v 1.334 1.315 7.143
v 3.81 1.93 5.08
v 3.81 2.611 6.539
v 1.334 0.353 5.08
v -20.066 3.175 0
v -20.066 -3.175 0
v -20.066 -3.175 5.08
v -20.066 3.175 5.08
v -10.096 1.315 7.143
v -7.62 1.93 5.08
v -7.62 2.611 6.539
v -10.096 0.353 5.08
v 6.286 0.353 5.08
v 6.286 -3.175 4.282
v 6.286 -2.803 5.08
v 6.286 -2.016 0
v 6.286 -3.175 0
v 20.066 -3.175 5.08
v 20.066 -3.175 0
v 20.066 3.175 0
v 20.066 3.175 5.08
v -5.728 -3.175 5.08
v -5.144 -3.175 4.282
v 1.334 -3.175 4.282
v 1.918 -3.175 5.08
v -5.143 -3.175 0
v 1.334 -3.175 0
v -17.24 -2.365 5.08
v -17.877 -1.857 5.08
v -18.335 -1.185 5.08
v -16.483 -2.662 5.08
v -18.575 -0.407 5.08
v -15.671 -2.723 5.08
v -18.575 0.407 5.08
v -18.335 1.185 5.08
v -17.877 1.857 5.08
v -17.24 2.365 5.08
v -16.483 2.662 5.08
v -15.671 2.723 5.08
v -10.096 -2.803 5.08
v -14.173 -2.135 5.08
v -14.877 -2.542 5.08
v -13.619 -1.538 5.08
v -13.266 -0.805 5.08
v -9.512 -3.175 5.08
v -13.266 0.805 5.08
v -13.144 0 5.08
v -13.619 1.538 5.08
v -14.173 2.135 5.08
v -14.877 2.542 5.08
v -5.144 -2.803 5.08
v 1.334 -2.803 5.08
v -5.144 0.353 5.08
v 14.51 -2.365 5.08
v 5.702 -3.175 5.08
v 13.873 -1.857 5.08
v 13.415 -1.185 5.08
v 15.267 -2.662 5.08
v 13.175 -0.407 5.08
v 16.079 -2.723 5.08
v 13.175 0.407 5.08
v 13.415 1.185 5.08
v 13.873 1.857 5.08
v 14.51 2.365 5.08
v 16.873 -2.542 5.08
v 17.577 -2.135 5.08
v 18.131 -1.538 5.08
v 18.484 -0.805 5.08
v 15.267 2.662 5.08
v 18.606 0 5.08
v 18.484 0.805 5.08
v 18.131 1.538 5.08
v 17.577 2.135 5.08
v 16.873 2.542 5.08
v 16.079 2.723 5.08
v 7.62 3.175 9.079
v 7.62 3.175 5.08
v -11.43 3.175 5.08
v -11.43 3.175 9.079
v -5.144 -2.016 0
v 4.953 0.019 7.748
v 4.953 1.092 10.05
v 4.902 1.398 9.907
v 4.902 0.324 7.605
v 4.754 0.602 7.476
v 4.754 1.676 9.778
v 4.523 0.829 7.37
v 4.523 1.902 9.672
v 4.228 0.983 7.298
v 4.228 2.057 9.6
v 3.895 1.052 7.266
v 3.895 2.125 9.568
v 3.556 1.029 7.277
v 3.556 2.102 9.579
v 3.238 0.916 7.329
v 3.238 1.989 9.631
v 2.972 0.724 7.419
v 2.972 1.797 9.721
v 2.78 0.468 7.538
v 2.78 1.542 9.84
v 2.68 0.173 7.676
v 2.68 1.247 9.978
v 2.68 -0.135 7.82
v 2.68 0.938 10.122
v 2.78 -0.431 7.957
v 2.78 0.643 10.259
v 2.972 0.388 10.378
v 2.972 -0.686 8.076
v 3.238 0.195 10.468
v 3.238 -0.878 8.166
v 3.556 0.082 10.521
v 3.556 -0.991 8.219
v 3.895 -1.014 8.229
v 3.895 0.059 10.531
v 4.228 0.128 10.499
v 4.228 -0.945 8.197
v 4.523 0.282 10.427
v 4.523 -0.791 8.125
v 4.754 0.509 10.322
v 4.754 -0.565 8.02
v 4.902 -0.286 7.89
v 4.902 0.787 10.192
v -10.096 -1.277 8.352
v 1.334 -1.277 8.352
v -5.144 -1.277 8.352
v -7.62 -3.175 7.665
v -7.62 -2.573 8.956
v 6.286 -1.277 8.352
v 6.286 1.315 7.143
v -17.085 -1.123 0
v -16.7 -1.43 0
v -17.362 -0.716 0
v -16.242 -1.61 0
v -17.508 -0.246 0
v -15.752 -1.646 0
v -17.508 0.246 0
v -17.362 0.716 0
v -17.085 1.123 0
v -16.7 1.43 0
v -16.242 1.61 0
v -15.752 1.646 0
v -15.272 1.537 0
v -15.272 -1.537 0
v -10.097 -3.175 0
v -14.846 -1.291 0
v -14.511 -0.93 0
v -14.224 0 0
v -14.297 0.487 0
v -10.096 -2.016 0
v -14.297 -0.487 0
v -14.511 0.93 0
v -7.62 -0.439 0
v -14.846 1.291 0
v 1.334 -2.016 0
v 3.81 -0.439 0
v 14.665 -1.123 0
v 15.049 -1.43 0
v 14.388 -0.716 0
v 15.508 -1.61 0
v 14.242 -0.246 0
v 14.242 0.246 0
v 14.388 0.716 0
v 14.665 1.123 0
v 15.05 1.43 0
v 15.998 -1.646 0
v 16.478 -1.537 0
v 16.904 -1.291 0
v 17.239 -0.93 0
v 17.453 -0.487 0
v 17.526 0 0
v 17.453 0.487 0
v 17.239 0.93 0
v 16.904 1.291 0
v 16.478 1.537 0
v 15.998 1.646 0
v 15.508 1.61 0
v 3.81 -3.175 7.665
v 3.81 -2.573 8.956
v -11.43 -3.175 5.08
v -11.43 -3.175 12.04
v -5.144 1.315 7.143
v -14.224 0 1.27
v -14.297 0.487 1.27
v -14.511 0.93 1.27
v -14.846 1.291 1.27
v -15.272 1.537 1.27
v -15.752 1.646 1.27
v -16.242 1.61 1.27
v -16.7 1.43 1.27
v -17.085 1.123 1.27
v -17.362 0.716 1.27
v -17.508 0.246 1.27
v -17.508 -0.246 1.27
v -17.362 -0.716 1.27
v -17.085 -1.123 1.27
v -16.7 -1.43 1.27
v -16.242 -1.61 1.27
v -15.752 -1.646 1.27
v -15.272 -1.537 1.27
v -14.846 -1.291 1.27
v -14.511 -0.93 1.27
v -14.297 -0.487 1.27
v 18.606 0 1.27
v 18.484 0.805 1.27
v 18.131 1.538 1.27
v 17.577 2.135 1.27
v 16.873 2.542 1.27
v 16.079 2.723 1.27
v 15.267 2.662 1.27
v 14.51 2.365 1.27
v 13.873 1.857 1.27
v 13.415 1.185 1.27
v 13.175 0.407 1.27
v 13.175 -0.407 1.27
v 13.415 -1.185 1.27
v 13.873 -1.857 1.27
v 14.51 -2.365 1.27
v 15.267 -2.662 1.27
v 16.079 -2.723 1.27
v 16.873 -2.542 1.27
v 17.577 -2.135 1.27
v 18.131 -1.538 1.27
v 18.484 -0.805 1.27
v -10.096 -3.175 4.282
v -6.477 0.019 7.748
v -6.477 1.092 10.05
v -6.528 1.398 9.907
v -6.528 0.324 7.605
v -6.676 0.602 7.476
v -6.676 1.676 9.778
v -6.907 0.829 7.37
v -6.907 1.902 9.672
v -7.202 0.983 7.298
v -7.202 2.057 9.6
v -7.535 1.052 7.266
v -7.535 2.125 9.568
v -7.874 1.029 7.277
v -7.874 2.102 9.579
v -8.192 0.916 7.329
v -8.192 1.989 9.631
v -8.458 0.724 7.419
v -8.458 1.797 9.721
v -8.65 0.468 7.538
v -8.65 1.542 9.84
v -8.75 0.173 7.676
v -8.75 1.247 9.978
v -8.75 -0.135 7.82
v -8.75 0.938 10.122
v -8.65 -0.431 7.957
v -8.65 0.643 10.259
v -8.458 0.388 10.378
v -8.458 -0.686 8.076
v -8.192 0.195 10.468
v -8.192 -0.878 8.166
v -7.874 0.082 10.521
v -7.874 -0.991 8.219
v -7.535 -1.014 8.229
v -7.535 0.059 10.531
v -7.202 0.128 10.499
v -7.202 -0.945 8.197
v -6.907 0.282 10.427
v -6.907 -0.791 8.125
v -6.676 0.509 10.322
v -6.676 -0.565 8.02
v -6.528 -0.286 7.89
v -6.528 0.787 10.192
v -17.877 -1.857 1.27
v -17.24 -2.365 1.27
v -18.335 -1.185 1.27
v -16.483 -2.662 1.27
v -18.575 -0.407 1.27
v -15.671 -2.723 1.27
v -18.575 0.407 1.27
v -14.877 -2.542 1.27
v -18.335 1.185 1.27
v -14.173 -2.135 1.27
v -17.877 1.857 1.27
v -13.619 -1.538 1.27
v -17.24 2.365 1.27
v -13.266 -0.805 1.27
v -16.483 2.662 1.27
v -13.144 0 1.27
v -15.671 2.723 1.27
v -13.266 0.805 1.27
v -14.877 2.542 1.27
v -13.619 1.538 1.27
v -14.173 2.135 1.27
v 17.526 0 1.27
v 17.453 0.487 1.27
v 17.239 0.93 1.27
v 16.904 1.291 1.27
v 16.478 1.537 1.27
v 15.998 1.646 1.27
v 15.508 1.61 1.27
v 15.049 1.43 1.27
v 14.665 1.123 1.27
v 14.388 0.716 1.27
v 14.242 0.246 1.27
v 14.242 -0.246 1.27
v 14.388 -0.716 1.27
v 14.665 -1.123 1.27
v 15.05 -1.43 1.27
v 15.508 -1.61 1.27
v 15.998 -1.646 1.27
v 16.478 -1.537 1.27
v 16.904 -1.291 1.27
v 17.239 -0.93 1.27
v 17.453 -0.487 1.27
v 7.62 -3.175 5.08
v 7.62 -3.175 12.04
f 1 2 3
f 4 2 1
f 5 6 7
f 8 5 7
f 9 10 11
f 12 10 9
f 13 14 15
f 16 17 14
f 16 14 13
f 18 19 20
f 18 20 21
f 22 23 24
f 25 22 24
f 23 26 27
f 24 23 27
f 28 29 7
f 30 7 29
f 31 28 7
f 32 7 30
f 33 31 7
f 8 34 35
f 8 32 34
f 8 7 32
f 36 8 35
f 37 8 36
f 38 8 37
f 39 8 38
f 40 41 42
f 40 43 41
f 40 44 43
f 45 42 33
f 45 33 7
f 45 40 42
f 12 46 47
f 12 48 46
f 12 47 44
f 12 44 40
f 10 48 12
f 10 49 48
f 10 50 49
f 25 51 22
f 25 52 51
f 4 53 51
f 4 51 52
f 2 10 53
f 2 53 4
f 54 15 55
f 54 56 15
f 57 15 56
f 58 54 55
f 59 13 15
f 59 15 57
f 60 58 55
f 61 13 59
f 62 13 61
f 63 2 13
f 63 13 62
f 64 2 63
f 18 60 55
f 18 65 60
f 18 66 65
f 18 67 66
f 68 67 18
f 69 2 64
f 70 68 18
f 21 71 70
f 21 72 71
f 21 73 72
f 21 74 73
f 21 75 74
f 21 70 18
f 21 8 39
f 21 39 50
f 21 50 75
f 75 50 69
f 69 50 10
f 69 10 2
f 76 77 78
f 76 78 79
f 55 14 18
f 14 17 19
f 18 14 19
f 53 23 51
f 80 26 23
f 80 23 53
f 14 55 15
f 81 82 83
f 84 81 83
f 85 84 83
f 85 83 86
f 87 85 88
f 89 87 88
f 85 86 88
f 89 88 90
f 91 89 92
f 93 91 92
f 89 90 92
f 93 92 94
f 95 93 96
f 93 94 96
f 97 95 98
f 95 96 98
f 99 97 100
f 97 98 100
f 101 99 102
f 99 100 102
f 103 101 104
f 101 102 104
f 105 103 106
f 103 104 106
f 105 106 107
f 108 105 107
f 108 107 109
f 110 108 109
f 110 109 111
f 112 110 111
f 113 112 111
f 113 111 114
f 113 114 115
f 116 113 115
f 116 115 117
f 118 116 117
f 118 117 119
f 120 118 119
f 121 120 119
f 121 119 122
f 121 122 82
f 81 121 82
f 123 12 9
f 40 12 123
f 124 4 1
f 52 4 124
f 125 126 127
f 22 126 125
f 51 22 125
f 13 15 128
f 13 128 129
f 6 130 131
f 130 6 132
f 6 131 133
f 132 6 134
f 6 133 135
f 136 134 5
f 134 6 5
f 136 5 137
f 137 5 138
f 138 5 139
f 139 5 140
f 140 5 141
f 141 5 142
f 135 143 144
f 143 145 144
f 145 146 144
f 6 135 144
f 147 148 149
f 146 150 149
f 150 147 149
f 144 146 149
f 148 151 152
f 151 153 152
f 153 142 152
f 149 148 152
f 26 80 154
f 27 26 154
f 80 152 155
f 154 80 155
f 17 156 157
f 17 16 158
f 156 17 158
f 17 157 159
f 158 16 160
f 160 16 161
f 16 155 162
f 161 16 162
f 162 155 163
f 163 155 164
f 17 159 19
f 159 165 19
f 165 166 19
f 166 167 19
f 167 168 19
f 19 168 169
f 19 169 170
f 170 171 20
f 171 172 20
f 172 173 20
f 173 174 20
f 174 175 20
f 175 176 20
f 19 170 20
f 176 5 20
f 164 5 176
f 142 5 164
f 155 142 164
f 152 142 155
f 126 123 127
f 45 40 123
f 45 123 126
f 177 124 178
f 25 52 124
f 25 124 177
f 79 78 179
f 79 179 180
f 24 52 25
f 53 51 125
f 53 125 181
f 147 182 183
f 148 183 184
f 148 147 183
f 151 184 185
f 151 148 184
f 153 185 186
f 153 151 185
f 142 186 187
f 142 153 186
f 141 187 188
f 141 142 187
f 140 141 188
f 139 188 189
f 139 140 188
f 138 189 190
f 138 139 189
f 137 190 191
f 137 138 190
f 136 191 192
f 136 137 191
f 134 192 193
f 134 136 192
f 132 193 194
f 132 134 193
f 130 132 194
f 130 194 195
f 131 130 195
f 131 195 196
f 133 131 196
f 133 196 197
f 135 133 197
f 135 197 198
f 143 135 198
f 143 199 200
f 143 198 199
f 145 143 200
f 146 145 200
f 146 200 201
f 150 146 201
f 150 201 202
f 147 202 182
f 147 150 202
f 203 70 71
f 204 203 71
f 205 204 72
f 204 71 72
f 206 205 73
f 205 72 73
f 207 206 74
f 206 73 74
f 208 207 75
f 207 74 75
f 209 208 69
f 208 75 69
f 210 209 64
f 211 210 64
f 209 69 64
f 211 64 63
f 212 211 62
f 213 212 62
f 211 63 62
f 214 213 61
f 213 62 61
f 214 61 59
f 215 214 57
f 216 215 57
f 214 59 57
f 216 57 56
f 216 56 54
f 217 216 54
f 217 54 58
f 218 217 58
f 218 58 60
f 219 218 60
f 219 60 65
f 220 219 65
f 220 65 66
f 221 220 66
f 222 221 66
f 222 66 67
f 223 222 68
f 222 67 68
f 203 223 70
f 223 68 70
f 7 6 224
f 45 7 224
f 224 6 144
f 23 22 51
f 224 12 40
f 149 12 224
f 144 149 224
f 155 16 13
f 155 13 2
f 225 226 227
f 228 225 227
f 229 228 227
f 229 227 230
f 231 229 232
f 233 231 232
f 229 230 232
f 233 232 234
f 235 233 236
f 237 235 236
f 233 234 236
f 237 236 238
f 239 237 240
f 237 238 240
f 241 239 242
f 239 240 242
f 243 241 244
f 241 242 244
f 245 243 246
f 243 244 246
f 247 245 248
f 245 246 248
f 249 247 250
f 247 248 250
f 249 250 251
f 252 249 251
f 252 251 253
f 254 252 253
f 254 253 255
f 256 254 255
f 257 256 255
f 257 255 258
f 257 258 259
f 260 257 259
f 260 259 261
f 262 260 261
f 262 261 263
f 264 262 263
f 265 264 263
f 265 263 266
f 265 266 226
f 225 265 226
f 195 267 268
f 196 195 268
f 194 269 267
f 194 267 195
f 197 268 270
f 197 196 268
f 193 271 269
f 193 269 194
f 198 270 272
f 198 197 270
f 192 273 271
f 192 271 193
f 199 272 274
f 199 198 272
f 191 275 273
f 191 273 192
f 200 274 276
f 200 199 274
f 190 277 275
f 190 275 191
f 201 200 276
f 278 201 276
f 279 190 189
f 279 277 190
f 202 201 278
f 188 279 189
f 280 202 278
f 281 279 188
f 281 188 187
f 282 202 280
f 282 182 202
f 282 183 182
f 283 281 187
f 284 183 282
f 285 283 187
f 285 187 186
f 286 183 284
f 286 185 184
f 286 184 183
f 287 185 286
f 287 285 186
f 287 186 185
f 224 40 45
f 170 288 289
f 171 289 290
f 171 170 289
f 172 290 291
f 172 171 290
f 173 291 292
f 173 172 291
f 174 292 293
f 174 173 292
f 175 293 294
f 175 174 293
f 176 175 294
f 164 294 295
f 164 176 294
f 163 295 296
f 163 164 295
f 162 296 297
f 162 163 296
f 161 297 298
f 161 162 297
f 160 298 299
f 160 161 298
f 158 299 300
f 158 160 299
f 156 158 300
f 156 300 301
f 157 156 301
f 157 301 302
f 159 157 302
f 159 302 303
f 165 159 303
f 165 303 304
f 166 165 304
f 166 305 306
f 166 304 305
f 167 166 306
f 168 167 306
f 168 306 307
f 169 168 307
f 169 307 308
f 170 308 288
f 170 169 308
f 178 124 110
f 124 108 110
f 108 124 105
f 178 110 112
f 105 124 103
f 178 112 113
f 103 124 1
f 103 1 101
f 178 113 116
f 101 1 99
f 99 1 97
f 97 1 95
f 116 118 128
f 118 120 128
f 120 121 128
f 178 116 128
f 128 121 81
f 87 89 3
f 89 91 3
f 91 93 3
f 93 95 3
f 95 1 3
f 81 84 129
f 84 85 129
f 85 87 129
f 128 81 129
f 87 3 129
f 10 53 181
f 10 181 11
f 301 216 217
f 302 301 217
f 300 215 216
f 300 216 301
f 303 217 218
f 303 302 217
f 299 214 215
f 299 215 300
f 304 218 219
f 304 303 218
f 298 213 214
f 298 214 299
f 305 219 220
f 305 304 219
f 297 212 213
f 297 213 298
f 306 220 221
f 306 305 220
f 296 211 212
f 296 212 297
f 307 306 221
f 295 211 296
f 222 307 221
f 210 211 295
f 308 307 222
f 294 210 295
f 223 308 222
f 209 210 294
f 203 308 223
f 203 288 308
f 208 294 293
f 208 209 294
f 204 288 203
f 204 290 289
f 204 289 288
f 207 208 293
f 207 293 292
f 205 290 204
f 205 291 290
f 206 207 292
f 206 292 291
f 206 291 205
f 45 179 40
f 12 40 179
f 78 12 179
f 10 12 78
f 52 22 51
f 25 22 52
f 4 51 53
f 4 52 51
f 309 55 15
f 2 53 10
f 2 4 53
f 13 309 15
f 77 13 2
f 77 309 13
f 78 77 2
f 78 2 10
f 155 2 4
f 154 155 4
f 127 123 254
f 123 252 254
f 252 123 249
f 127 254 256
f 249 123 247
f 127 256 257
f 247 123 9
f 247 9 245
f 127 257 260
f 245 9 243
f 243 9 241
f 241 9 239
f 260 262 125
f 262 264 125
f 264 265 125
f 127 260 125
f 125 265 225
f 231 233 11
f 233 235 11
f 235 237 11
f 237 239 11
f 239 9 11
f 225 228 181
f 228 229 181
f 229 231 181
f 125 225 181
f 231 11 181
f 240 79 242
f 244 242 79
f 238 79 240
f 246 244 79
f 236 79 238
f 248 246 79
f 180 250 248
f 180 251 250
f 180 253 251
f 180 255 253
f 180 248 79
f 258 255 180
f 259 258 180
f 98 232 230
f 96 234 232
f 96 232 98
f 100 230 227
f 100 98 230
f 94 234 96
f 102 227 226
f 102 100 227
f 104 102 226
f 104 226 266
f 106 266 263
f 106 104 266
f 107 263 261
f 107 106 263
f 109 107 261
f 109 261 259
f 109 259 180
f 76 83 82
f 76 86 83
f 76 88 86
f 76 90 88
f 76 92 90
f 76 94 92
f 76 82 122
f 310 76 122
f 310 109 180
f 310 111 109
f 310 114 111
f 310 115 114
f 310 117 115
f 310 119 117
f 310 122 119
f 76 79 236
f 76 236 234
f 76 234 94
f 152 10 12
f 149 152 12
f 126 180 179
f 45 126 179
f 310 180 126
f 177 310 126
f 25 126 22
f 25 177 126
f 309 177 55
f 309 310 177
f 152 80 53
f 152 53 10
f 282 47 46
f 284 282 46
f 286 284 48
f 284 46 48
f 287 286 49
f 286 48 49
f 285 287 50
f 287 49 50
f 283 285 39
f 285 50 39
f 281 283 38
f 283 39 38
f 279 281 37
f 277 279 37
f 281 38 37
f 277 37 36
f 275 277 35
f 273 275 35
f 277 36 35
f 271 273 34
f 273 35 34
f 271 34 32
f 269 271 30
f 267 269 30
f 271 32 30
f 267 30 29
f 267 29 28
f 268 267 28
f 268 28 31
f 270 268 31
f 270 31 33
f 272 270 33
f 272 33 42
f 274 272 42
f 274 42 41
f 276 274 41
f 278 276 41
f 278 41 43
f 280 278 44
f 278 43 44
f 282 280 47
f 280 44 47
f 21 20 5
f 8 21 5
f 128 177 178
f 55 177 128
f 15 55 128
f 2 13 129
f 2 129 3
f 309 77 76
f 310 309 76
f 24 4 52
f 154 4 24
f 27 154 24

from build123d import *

# Parameters (mm, degrees)
F0_R      = 1.651
F1_DEPTH  = 5.08
F2_R      = 2.7305
F3_DEPTH  = 3.81
F5_DEPTH  = 57.15
F6_W      = 17.145
F6_H      = 6.9596
F6_W_2    = 20.955
F7_DEPTH  = 6.35
F9_W      = 8.509
F9_H      = 5.08
F10_DEPTH = 7.621
F11_R     = 1.143
F12_DEPTH = 10.9125832328
F14_DEPTH = 10.16


with BuildPart() as f1:
    # F0 (on Top) → F1 (new body)
    with BuildSketch(Plane.XY):
        Polygon((-28.575, -3.175), (28.575, -3.175), (28.575, 4.445), (22.225, 4.445), (22.225, 3.175), (-22.225, 3.175), (-22.225, 4.445), (-28.575, 4.445), align=None)
        with Locations((-15.875, 0)):
            Circle(F0_R, mode=Mode.SUBTRACT)
        with Locations((15.875, 0)):
            Circle(F0_R, mode=Mode.SUBTRACT)
    extrude(amount=F1_DEPTH)

    # F2 (on face) → F3 (cut)
    with BuildSketch(Plane.XY.offset(5.08)):
        with Locations((-15.875, 0)):
            Circle(F2_R)
        with Locations((15.875, 0)):
            Circle(F2_R)
    extrude(amount=-F3_DEPTH, mode=Mode.SUBTRACT)

    # F9 (on face) → F10 (cut, through all)
    with BuildSketch(Plane.XZ.offset(3.175)):
        with Locations((-24.3205, 2.54)):
            Rectangle(F9_W, F9_H)
        with Locations((24.3205, 2.54)):
            Rectangle(F9_W, F9_H)
    extrude(amount=-F10_DEPTH, mode=Mode.SUBTRACT)


with BuildPart() as f5:
    # F4 (on face) → F5 (new body)
    with BuildSketch(Plane.YZ.offset(28.575)):
        Polygon((-3.175, 12.0396), (-3.175, 5.08), (3.175, 5.08), (3.175, 9.0785463707), align=None)
    extrude(amount=-F5_DEPTH)

    # F6 (on face) → F7 (cut, through all)
    with BuildSketch(Plane.XZ.offset(3.175)):
        with Locations((-20.0025, 8.5598)):
            Rectangle(F6_W, F6_H)
        with Locations((18.0975, 8.5598)):
            Rectangle(F6_W_2, F6_H)
    extrude(amount=-F7_DEPTH, mode=Mode.SUBTRACT)


with BuildPart() as f12_tool:
    # F11 (on face) → F12 (new body, through all)
    with BuildSketch(Plane(origin=(0, 4.0443596691, 8.6731572993), x_dir=(1, 0, 0), z_dir=(0, 0.4226182617, 0.906307787))):
        with Locations((-7.62, -3.2571735458)):
            Circle(F11_R)
        with Locations((3.81, -3.2571735458)):
            Circle(F11_R)
    extrude(amount=-F12_DEPTH)


with BuildPart() as f1_1:
    add(f1.part)

    # F12: cut by f12_tool
    add(f12_tool.part, mode=Mode.SUBTRACT)


with BuildPart() as f5_1:
    add(f5.part)

    # F12: cut by f12_tool
    add(f12_tool.part, mode=Mode.SUBTRACT)


with BuildPart() as f14_tool:
    # F13 (on offset) → F14 (new body)
    with BuildSketch(Plane(origin=(0, -1.322892255, -2.836951596), x_dir=(1, 0, 0), z_dir=(0, 0.4226182617, 0.906307787))):
        Polygon((-5.1435, -4.6869814874), (-5.1435, -1.8273656042), (-7.62, -0.3975576625), (-10.0965, -1.8273656042), (-10.0965, -4.6869814874), (-7.62, -6.1167894291), align=None)
        Polygon((6.2865, -1.8273656042), (3.81, -0.3975576625), (1.3335, -1.8273656042), (1.3335, -4.6869814874), (3.81, -6.1167894291), (6.2865, -4.6869814874), align=None)
    extrude(amount=F14_DEPTH)


with BuildPart() as f1_2:
    add(f1_1.part)

    # F14: cut by f14_tool
    add(f14_tool.part, mode=Mode.SUBTRACT)


with BuildPart() as f5_2:
    add(f5_1.part)

    # F14: cut by f14_tool
    add(f14_tool.part, mode=Mode.SUBTRACT)


solid = Compound([f1_2.part, f5_2.part])
